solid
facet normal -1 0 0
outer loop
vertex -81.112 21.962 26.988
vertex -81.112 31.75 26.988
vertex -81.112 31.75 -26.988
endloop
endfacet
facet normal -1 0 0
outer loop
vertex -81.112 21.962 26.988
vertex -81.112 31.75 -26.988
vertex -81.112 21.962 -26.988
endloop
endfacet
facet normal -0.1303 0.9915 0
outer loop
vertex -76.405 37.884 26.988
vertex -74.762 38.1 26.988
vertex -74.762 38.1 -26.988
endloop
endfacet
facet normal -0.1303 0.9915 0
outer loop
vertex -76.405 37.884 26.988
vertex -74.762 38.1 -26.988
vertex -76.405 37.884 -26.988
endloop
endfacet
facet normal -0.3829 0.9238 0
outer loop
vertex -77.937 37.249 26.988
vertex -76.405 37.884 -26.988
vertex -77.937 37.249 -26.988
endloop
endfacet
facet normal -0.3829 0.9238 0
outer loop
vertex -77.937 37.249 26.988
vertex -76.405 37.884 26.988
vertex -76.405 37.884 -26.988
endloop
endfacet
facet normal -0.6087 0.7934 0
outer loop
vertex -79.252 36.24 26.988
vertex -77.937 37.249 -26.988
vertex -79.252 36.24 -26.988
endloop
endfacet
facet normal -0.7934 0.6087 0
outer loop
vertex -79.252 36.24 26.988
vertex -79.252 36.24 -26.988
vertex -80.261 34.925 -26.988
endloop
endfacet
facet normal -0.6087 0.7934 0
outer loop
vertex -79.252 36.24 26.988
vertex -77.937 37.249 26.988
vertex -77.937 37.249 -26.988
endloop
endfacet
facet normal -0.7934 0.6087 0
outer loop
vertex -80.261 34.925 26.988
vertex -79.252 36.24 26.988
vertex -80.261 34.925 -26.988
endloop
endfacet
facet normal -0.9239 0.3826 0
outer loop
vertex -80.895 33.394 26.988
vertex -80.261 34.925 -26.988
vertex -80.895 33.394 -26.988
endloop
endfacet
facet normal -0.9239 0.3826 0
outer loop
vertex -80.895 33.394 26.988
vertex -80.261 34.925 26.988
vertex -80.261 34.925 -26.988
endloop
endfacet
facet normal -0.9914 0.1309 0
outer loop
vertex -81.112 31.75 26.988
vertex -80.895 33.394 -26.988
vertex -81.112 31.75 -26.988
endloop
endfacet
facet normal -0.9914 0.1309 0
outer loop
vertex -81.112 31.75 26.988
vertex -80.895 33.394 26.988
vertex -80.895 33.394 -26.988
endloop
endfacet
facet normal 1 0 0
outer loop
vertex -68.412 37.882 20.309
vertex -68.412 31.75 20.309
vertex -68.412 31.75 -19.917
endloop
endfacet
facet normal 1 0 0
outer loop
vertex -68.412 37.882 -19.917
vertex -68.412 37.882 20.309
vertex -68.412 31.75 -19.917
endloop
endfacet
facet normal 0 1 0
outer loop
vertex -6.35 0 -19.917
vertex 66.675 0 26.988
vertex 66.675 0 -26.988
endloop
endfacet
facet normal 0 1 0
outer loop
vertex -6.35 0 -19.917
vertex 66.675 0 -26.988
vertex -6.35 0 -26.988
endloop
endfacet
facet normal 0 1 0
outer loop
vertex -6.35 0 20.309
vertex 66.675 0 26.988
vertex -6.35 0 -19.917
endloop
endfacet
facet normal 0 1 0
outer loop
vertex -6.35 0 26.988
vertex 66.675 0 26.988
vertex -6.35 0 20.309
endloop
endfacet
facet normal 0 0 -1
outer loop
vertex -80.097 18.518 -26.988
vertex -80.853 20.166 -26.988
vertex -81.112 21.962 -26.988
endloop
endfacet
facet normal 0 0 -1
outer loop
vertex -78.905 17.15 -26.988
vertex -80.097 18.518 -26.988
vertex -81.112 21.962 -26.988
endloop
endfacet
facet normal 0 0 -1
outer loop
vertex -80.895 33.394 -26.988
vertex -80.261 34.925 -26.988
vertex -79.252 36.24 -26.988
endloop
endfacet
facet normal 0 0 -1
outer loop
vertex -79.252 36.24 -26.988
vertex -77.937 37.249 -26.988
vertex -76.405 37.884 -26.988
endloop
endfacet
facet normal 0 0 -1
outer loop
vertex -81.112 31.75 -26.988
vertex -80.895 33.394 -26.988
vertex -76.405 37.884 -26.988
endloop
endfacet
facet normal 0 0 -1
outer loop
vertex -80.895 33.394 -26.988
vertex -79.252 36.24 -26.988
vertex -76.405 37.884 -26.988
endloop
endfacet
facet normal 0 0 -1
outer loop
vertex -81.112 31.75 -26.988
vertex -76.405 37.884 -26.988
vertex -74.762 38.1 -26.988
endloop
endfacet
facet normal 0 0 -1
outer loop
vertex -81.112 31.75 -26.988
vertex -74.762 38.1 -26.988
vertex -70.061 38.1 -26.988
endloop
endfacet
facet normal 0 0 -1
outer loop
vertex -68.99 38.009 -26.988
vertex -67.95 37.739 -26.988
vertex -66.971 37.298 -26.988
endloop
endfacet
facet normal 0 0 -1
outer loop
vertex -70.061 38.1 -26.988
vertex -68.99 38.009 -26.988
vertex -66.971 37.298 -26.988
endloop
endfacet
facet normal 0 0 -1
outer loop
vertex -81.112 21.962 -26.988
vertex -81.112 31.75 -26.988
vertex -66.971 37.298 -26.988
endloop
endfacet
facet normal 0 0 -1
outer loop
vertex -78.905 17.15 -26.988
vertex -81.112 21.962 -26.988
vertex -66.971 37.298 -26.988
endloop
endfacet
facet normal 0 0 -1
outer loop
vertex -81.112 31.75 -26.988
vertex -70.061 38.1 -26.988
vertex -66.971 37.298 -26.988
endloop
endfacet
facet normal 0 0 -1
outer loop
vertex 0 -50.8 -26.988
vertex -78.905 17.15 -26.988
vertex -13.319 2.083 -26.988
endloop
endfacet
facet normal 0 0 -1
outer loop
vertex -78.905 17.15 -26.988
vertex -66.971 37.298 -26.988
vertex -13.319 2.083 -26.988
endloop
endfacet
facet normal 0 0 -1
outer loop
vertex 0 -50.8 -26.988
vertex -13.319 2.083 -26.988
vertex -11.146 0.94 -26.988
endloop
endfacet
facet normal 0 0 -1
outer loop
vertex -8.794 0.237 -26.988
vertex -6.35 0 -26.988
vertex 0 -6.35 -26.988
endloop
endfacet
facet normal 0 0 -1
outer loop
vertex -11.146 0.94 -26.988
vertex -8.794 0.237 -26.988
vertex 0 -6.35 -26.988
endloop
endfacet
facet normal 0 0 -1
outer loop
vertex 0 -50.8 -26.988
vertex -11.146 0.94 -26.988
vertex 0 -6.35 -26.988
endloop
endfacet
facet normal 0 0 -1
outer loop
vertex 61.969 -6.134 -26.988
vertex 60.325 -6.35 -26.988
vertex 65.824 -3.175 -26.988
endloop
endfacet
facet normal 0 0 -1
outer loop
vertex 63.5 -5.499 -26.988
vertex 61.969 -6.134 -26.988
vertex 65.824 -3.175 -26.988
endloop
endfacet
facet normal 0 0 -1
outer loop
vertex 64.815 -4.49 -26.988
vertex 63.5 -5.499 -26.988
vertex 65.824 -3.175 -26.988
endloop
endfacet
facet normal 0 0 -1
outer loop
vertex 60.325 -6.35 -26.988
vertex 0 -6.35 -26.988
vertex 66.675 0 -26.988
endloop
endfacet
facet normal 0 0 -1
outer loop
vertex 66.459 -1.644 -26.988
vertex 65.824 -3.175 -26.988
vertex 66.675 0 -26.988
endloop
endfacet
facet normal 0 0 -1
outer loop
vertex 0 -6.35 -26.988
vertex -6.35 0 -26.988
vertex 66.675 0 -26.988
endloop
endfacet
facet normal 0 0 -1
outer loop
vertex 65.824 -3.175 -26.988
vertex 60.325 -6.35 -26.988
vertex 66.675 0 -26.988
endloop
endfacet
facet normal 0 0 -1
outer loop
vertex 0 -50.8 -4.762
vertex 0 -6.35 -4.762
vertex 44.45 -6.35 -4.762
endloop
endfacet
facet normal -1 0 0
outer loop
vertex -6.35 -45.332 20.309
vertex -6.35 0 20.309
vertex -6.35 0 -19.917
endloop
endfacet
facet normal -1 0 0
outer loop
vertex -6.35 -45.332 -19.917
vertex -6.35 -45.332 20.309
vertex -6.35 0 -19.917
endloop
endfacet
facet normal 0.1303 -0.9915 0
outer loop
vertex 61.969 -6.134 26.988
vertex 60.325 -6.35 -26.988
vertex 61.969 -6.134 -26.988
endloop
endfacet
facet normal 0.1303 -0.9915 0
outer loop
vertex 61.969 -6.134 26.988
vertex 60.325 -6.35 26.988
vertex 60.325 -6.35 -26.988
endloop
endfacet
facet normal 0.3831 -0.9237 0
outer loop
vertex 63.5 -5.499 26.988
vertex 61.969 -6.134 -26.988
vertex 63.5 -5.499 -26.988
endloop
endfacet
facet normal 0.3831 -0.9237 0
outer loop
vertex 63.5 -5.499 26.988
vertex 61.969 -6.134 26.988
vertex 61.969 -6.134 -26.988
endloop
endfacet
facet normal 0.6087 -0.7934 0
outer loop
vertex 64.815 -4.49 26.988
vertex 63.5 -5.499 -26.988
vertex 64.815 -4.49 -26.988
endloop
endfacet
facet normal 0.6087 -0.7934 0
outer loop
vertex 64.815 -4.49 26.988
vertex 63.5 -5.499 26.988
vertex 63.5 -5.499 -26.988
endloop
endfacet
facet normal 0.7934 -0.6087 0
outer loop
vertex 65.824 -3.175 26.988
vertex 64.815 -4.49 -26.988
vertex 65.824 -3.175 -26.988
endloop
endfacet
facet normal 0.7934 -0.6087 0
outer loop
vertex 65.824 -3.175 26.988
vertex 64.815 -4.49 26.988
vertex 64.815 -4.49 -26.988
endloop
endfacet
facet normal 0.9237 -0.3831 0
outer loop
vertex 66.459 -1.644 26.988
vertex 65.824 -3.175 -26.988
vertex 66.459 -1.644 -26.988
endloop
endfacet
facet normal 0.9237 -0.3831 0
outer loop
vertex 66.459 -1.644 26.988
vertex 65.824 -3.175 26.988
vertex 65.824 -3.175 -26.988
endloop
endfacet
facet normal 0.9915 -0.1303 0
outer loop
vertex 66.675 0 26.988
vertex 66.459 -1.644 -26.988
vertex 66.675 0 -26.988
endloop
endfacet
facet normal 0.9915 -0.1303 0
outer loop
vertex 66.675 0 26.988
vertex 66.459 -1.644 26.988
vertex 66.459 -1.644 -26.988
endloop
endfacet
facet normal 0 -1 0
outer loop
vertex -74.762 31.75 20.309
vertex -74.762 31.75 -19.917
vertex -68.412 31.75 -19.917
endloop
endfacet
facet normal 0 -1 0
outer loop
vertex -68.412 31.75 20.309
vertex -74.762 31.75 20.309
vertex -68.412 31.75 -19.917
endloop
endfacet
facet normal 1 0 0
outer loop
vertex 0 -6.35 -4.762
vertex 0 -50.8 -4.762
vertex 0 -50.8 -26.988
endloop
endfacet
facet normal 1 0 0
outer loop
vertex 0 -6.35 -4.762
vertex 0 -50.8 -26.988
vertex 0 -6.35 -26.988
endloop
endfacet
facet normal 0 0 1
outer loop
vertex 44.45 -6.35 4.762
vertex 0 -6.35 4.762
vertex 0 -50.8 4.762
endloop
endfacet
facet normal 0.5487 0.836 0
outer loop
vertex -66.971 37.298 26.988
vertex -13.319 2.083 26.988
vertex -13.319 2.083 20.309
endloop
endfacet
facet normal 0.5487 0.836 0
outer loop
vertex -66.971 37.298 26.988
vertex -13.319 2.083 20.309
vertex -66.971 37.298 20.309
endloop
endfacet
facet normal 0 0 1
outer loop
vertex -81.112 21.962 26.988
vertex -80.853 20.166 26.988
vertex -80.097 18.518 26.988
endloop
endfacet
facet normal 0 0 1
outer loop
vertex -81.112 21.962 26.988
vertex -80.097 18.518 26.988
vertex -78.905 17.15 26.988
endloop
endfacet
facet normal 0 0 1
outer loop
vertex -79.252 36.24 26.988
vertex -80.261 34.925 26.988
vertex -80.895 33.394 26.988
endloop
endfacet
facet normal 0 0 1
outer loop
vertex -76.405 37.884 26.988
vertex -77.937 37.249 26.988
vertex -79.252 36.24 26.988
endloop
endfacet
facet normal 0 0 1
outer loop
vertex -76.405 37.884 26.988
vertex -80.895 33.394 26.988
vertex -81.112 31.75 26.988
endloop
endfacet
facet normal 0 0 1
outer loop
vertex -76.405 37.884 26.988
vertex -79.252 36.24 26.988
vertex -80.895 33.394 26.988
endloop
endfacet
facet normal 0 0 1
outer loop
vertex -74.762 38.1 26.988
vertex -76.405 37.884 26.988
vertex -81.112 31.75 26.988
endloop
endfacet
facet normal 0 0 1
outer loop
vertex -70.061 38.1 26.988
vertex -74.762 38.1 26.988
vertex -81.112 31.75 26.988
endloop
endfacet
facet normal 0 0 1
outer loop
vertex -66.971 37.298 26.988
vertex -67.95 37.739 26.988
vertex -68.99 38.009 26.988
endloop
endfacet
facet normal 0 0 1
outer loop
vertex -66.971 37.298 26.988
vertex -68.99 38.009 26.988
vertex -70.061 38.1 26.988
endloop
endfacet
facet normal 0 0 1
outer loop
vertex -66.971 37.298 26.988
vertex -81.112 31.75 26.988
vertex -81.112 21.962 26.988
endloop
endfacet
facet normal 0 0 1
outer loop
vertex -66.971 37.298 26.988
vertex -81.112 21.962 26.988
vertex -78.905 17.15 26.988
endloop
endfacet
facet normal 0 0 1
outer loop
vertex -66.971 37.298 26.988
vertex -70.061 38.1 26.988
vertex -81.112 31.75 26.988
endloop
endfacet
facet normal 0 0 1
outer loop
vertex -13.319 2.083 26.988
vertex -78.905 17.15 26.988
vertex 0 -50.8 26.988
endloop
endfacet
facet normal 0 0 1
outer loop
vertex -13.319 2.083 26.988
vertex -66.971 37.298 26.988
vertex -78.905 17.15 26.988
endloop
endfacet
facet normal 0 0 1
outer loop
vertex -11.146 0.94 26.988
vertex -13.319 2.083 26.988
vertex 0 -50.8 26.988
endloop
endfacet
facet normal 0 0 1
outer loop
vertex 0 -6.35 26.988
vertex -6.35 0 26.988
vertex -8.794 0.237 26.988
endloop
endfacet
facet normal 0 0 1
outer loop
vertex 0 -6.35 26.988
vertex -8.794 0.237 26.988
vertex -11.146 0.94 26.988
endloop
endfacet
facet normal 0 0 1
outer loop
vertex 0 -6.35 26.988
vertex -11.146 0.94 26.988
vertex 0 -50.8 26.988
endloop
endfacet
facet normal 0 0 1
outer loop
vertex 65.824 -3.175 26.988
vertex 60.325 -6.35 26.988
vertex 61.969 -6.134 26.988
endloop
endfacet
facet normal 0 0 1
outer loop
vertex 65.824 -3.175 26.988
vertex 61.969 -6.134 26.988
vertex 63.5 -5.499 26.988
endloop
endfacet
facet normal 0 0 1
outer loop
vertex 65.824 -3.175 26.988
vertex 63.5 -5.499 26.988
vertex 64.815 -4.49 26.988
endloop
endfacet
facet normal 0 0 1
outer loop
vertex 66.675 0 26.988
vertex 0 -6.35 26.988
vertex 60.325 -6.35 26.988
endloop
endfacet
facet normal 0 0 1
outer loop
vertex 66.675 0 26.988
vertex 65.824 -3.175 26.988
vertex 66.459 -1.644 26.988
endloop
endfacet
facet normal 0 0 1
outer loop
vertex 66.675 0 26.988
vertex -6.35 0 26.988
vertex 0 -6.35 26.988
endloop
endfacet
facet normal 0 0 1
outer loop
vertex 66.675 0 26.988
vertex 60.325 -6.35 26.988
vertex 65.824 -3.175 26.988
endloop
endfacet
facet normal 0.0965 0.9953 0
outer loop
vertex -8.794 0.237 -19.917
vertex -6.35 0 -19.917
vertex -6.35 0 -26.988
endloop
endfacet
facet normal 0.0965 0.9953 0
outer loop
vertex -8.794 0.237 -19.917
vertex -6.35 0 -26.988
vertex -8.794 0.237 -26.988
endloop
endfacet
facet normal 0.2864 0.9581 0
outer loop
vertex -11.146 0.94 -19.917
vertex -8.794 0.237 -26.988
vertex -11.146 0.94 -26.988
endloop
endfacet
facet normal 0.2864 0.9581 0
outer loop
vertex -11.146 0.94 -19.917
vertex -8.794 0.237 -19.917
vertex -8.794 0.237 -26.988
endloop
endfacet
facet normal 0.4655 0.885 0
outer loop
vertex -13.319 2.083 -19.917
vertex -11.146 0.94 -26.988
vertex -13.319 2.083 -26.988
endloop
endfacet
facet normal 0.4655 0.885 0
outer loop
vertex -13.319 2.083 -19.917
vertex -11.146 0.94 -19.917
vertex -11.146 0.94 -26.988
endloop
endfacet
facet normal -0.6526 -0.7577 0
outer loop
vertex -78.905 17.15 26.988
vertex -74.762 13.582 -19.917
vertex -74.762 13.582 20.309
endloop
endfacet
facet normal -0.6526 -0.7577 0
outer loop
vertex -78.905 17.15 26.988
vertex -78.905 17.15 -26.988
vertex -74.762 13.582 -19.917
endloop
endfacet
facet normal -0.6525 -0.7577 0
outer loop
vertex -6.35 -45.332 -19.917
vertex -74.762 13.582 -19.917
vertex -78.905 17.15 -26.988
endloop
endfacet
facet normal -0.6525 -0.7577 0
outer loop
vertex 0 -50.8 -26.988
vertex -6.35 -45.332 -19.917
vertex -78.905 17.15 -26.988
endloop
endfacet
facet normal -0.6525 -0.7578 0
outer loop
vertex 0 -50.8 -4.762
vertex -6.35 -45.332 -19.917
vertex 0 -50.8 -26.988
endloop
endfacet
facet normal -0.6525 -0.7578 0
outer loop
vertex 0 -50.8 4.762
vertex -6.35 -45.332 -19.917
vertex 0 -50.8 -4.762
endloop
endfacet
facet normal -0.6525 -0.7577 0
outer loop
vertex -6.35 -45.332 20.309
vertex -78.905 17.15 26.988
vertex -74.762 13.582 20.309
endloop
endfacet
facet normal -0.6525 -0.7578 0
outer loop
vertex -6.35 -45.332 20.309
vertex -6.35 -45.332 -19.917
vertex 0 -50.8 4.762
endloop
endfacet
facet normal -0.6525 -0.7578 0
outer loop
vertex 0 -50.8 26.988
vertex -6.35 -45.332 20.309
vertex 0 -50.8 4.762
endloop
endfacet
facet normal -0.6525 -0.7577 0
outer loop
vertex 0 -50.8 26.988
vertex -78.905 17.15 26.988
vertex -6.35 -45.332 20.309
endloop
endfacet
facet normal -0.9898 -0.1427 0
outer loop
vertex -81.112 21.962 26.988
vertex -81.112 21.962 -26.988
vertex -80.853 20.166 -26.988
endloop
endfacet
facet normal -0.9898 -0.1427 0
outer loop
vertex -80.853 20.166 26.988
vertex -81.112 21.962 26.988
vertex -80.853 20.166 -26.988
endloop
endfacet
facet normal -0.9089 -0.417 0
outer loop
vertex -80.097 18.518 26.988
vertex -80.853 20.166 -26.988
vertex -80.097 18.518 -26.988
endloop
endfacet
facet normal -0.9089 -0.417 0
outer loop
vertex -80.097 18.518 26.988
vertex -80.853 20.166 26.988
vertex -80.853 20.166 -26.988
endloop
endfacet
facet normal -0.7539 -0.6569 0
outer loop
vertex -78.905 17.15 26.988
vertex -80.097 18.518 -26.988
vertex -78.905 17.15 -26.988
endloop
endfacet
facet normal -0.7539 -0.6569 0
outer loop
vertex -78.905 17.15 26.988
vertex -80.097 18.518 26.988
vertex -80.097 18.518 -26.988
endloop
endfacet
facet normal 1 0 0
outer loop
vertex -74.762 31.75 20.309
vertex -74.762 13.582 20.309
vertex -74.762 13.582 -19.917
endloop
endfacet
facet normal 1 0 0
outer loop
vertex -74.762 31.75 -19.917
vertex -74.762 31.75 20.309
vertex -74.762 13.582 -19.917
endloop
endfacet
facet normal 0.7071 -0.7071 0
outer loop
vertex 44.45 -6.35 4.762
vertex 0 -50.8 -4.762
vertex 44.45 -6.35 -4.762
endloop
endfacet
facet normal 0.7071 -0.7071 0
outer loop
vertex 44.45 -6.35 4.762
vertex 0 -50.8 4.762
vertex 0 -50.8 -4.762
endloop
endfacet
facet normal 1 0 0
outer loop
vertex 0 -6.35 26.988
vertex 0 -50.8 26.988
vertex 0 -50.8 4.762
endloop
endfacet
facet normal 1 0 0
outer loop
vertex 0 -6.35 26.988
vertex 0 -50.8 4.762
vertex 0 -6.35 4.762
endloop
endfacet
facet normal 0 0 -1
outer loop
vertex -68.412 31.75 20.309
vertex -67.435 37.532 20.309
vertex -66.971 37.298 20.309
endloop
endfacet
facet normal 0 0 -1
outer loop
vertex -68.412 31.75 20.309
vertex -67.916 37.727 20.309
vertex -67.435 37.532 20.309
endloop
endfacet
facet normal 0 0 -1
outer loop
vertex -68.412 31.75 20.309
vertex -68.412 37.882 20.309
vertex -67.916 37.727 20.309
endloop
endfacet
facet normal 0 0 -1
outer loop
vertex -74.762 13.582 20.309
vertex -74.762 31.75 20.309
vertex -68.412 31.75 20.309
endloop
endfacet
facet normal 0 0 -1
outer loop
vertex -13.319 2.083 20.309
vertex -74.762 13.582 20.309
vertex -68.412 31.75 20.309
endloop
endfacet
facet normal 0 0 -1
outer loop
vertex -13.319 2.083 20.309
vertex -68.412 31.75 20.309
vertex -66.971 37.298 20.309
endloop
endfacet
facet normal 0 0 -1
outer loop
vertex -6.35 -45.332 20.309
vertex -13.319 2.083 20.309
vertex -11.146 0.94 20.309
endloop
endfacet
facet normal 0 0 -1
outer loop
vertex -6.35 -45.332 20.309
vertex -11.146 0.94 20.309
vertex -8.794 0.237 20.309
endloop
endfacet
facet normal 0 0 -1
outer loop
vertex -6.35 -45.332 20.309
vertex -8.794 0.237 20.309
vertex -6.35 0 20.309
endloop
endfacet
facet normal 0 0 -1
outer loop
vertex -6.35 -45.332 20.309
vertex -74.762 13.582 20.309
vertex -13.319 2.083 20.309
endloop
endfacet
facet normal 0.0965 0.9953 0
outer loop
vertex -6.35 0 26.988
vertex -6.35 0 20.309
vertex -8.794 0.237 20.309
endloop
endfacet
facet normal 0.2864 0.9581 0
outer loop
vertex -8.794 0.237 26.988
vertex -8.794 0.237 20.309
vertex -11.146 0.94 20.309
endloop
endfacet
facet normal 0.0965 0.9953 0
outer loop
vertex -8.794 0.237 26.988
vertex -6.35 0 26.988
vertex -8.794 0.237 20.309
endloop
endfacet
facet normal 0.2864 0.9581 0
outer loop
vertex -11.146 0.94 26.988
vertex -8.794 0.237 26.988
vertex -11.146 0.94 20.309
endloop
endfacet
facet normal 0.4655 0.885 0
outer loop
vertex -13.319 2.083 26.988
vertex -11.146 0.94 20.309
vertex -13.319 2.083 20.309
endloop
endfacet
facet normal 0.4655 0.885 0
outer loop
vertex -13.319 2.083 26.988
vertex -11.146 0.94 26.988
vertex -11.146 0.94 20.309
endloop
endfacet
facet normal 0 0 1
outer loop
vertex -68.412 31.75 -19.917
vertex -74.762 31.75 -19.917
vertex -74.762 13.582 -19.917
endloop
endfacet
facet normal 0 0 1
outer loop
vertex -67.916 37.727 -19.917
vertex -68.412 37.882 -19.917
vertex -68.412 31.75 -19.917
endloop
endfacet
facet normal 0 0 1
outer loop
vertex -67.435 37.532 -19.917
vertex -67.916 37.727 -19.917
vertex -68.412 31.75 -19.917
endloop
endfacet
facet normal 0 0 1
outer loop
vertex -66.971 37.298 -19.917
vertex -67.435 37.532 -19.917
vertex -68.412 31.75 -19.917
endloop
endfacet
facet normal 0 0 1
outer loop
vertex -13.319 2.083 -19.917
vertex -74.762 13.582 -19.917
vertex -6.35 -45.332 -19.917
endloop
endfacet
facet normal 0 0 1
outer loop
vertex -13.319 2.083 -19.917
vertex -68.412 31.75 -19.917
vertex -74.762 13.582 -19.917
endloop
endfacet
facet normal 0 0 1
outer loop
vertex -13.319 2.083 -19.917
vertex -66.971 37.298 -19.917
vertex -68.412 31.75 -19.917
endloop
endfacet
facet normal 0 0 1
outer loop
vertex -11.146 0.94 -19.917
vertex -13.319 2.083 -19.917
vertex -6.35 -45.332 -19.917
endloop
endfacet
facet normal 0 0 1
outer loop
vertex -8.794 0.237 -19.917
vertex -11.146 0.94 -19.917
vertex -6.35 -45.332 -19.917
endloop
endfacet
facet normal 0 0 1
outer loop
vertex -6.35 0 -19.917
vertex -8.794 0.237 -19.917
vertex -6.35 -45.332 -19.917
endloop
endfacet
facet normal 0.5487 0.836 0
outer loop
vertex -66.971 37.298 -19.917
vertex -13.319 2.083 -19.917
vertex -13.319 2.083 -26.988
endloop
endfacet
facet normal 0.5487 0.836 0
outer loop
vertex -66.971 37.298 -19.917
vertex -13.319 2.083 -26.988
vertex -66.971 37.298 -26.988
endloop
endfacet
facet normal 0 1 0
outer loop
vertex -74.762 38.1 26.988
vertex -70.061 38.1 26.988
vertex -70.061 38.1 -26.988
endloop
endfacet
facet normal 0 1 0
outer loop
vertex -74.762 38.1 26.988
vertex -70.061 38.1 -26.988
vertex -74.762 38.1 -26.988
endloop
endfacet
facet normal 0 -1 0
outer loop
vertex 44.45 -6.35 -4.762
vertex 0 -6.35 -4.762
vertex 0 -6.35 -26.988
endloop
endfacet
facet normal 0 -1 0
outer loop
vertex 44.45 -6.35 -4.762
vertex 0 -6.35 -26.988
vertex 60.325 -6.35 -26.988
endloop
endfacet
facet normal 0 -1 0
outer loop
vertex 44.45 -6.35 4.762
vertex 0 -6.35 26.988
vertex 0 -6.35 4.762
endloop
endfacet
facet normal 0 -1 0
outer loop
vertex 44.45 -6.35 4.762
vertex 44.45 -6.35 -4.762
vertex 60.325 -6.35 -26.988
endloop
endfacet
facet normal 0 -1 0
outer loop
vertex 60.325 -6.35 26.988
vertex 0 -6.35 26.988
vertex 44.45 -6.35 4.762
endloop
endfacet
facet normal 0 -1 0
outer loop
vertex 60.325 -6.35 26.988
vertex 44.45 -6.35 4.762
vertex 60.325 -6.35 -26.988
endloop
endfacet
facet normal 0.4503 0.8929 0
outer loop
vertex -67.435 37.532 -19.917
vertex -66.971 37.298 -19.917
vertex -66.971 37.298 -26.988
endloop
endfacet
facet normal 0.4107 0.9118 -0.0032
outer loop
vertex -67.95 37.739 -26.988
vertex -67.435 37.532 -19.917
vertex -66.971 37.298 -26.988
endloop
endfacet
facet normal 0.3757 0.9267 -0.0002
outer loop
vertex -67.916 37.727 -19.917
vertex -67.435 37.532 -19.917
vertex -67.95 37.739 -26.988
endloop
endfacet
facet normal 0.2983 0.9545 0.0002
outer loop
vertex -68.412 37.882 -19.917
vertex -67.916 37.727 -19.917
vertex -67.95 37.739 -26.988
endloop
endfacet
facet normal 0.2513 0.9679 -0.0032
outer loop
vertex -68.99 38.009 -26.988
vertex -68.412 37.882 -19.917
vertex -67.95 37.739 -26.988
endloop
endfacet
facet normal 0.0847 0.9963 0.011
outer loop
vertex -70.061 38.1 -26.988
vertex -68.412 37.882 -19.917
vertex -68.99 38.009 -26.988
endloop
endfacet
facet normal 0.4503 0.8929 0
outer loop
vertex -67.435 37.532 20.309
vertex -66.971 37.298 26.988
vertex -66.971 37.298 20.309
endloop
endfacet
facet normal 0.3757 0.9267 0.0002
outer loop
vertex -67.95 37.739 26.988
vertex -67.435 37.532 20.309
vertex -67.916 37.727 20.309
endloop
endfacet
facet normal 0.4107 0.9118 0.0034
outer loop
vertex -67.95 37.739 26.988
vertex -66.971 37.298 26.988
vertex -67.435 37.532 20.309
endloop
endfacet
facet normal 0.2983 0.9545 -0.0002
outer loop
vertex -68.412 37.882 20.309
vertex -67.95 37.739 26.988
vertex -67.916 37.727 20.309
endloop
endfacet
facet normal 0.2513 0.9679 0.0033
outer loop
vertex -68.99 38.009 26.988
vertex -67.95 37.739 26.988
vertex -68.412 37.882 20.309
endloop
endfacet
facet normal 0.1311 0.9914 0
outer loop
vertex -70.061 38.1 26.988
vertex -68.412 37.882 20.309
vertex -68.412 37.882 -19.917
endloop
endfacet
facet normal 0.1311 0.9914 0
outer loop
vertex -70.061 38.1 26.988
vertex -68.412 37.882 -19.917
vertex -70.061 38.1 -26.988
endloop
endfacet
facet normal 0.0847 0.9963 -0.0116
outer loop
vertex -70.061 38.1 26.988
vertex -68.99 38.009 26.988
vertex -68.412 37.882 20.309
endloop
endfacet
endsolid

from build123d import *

# Parameters (mm, degrees)
BOSS_EXTRUDE2_DEPTH     = 26.9875
SKETCH3_W               = 62.061672923
SKETCH3_H               = 40.225982375
CUT_EXTRUDE1_DEPTH      = 39.1
CUT_EXTRUDE1_DEPTH_BACK = 51.8
SKETCH4_W               = 6.35
SKETCH4_H               = 40.225982375
CUT_EXTRUDE2_DEPTH      = 31.75
BOSS_EXTRUDE3_DEPTH     = 4.7625


with BuildPart() as part:
    # Sketch1 → Boss-Extrude2 (new body, symmetric)
    with BuildSketch(Plane.XY):
        with BuildLine():
            Line((66.675, 0), (-6.35, 0))
            ThreePointArc((-6.35, 0), (-9.986642245, 0.531810604), (-13.318716788, 2.082703436))
            Line((-13.318716788, 2.082703436), (-66.971034996, 37.297676322))
            ThreePointArc((-66.971034996, 37.297676322), (-68.46461012, 37.896146949), (-70.06066077, 38.1))
            Line((-70.06066077, 38.1), (-74.761672923, 38.1))
            ThreePointArc((-74.761672923, 38.1), (-79.251800983, 36.240128061), (-81.111672923, 31.75))
            Line((-81.111672923, 31.75), (-81.111672923, 21.961704715))
            ThreePointArc((-81.111672923, 21.961704715), (-80.533790997, 19.314979768), (-78.90532554, 17.149985376))
            Line((-78.90532554, 17.149985376), (0, -50.8))
            Line((0, -50.8), (0, -6.35))
            Line((0, -6.35), (60.325, -6.35))
            ThreePointArc((60.325, -6.35), (64.815128061, -4.490128061), (66.675, 0))
        make_face()
    extrude(amount=BOSS_EXTRUDE2_DEPTH, both=True)

    # Sketch3 → Cut-Extrude1 (cut, two sides)
    with BuildSketch(Plane(origin=(0, 0, 0), x_dir=(1, 0, 0), z_dir=(0, 1, 0))) as cut_extrude1_sk:
        with Locations((-37.380836461, -0.195905759)):
            Rectangle(SKETCH3_W, SKETCH3_H)
    extrude(amount=CUT_EXTRUDE1_DEPTH, mode=Mode.SUBTRACT)
    extrude(cut_extrude1_sk.sketch, amount=-CUT_EXTRUDE1_DEPTH_BACK, mode=Mode.SUBTRACT)

    # Sketch4 → Cut-Extrude2 (cut)
    with BuildSketch(Plane(origin=(0, 0, 0), x_dir=(1, 0, 0), z_dir=(0, 1, 0))):
        with Locations((-71.586672923, -0.195905759)):
            Rectangle(SKETCH4_W, SKETCH4_H)
    extrude(amount=CUT_EXTRUDE2_DEPTH, mode=Mode.SUBTRACT)

    # Sketch5 → Boss-Extrude3 (add, symmetric)
    with BuildSketch(Plane.XY):
        Polygon((0, -50.8), (44.45, -6.35), (0, -6.35), align=None)
    extrude(amount=BOSS_EXTRUDE3_DEPTH, both=True)


solid = part.part
